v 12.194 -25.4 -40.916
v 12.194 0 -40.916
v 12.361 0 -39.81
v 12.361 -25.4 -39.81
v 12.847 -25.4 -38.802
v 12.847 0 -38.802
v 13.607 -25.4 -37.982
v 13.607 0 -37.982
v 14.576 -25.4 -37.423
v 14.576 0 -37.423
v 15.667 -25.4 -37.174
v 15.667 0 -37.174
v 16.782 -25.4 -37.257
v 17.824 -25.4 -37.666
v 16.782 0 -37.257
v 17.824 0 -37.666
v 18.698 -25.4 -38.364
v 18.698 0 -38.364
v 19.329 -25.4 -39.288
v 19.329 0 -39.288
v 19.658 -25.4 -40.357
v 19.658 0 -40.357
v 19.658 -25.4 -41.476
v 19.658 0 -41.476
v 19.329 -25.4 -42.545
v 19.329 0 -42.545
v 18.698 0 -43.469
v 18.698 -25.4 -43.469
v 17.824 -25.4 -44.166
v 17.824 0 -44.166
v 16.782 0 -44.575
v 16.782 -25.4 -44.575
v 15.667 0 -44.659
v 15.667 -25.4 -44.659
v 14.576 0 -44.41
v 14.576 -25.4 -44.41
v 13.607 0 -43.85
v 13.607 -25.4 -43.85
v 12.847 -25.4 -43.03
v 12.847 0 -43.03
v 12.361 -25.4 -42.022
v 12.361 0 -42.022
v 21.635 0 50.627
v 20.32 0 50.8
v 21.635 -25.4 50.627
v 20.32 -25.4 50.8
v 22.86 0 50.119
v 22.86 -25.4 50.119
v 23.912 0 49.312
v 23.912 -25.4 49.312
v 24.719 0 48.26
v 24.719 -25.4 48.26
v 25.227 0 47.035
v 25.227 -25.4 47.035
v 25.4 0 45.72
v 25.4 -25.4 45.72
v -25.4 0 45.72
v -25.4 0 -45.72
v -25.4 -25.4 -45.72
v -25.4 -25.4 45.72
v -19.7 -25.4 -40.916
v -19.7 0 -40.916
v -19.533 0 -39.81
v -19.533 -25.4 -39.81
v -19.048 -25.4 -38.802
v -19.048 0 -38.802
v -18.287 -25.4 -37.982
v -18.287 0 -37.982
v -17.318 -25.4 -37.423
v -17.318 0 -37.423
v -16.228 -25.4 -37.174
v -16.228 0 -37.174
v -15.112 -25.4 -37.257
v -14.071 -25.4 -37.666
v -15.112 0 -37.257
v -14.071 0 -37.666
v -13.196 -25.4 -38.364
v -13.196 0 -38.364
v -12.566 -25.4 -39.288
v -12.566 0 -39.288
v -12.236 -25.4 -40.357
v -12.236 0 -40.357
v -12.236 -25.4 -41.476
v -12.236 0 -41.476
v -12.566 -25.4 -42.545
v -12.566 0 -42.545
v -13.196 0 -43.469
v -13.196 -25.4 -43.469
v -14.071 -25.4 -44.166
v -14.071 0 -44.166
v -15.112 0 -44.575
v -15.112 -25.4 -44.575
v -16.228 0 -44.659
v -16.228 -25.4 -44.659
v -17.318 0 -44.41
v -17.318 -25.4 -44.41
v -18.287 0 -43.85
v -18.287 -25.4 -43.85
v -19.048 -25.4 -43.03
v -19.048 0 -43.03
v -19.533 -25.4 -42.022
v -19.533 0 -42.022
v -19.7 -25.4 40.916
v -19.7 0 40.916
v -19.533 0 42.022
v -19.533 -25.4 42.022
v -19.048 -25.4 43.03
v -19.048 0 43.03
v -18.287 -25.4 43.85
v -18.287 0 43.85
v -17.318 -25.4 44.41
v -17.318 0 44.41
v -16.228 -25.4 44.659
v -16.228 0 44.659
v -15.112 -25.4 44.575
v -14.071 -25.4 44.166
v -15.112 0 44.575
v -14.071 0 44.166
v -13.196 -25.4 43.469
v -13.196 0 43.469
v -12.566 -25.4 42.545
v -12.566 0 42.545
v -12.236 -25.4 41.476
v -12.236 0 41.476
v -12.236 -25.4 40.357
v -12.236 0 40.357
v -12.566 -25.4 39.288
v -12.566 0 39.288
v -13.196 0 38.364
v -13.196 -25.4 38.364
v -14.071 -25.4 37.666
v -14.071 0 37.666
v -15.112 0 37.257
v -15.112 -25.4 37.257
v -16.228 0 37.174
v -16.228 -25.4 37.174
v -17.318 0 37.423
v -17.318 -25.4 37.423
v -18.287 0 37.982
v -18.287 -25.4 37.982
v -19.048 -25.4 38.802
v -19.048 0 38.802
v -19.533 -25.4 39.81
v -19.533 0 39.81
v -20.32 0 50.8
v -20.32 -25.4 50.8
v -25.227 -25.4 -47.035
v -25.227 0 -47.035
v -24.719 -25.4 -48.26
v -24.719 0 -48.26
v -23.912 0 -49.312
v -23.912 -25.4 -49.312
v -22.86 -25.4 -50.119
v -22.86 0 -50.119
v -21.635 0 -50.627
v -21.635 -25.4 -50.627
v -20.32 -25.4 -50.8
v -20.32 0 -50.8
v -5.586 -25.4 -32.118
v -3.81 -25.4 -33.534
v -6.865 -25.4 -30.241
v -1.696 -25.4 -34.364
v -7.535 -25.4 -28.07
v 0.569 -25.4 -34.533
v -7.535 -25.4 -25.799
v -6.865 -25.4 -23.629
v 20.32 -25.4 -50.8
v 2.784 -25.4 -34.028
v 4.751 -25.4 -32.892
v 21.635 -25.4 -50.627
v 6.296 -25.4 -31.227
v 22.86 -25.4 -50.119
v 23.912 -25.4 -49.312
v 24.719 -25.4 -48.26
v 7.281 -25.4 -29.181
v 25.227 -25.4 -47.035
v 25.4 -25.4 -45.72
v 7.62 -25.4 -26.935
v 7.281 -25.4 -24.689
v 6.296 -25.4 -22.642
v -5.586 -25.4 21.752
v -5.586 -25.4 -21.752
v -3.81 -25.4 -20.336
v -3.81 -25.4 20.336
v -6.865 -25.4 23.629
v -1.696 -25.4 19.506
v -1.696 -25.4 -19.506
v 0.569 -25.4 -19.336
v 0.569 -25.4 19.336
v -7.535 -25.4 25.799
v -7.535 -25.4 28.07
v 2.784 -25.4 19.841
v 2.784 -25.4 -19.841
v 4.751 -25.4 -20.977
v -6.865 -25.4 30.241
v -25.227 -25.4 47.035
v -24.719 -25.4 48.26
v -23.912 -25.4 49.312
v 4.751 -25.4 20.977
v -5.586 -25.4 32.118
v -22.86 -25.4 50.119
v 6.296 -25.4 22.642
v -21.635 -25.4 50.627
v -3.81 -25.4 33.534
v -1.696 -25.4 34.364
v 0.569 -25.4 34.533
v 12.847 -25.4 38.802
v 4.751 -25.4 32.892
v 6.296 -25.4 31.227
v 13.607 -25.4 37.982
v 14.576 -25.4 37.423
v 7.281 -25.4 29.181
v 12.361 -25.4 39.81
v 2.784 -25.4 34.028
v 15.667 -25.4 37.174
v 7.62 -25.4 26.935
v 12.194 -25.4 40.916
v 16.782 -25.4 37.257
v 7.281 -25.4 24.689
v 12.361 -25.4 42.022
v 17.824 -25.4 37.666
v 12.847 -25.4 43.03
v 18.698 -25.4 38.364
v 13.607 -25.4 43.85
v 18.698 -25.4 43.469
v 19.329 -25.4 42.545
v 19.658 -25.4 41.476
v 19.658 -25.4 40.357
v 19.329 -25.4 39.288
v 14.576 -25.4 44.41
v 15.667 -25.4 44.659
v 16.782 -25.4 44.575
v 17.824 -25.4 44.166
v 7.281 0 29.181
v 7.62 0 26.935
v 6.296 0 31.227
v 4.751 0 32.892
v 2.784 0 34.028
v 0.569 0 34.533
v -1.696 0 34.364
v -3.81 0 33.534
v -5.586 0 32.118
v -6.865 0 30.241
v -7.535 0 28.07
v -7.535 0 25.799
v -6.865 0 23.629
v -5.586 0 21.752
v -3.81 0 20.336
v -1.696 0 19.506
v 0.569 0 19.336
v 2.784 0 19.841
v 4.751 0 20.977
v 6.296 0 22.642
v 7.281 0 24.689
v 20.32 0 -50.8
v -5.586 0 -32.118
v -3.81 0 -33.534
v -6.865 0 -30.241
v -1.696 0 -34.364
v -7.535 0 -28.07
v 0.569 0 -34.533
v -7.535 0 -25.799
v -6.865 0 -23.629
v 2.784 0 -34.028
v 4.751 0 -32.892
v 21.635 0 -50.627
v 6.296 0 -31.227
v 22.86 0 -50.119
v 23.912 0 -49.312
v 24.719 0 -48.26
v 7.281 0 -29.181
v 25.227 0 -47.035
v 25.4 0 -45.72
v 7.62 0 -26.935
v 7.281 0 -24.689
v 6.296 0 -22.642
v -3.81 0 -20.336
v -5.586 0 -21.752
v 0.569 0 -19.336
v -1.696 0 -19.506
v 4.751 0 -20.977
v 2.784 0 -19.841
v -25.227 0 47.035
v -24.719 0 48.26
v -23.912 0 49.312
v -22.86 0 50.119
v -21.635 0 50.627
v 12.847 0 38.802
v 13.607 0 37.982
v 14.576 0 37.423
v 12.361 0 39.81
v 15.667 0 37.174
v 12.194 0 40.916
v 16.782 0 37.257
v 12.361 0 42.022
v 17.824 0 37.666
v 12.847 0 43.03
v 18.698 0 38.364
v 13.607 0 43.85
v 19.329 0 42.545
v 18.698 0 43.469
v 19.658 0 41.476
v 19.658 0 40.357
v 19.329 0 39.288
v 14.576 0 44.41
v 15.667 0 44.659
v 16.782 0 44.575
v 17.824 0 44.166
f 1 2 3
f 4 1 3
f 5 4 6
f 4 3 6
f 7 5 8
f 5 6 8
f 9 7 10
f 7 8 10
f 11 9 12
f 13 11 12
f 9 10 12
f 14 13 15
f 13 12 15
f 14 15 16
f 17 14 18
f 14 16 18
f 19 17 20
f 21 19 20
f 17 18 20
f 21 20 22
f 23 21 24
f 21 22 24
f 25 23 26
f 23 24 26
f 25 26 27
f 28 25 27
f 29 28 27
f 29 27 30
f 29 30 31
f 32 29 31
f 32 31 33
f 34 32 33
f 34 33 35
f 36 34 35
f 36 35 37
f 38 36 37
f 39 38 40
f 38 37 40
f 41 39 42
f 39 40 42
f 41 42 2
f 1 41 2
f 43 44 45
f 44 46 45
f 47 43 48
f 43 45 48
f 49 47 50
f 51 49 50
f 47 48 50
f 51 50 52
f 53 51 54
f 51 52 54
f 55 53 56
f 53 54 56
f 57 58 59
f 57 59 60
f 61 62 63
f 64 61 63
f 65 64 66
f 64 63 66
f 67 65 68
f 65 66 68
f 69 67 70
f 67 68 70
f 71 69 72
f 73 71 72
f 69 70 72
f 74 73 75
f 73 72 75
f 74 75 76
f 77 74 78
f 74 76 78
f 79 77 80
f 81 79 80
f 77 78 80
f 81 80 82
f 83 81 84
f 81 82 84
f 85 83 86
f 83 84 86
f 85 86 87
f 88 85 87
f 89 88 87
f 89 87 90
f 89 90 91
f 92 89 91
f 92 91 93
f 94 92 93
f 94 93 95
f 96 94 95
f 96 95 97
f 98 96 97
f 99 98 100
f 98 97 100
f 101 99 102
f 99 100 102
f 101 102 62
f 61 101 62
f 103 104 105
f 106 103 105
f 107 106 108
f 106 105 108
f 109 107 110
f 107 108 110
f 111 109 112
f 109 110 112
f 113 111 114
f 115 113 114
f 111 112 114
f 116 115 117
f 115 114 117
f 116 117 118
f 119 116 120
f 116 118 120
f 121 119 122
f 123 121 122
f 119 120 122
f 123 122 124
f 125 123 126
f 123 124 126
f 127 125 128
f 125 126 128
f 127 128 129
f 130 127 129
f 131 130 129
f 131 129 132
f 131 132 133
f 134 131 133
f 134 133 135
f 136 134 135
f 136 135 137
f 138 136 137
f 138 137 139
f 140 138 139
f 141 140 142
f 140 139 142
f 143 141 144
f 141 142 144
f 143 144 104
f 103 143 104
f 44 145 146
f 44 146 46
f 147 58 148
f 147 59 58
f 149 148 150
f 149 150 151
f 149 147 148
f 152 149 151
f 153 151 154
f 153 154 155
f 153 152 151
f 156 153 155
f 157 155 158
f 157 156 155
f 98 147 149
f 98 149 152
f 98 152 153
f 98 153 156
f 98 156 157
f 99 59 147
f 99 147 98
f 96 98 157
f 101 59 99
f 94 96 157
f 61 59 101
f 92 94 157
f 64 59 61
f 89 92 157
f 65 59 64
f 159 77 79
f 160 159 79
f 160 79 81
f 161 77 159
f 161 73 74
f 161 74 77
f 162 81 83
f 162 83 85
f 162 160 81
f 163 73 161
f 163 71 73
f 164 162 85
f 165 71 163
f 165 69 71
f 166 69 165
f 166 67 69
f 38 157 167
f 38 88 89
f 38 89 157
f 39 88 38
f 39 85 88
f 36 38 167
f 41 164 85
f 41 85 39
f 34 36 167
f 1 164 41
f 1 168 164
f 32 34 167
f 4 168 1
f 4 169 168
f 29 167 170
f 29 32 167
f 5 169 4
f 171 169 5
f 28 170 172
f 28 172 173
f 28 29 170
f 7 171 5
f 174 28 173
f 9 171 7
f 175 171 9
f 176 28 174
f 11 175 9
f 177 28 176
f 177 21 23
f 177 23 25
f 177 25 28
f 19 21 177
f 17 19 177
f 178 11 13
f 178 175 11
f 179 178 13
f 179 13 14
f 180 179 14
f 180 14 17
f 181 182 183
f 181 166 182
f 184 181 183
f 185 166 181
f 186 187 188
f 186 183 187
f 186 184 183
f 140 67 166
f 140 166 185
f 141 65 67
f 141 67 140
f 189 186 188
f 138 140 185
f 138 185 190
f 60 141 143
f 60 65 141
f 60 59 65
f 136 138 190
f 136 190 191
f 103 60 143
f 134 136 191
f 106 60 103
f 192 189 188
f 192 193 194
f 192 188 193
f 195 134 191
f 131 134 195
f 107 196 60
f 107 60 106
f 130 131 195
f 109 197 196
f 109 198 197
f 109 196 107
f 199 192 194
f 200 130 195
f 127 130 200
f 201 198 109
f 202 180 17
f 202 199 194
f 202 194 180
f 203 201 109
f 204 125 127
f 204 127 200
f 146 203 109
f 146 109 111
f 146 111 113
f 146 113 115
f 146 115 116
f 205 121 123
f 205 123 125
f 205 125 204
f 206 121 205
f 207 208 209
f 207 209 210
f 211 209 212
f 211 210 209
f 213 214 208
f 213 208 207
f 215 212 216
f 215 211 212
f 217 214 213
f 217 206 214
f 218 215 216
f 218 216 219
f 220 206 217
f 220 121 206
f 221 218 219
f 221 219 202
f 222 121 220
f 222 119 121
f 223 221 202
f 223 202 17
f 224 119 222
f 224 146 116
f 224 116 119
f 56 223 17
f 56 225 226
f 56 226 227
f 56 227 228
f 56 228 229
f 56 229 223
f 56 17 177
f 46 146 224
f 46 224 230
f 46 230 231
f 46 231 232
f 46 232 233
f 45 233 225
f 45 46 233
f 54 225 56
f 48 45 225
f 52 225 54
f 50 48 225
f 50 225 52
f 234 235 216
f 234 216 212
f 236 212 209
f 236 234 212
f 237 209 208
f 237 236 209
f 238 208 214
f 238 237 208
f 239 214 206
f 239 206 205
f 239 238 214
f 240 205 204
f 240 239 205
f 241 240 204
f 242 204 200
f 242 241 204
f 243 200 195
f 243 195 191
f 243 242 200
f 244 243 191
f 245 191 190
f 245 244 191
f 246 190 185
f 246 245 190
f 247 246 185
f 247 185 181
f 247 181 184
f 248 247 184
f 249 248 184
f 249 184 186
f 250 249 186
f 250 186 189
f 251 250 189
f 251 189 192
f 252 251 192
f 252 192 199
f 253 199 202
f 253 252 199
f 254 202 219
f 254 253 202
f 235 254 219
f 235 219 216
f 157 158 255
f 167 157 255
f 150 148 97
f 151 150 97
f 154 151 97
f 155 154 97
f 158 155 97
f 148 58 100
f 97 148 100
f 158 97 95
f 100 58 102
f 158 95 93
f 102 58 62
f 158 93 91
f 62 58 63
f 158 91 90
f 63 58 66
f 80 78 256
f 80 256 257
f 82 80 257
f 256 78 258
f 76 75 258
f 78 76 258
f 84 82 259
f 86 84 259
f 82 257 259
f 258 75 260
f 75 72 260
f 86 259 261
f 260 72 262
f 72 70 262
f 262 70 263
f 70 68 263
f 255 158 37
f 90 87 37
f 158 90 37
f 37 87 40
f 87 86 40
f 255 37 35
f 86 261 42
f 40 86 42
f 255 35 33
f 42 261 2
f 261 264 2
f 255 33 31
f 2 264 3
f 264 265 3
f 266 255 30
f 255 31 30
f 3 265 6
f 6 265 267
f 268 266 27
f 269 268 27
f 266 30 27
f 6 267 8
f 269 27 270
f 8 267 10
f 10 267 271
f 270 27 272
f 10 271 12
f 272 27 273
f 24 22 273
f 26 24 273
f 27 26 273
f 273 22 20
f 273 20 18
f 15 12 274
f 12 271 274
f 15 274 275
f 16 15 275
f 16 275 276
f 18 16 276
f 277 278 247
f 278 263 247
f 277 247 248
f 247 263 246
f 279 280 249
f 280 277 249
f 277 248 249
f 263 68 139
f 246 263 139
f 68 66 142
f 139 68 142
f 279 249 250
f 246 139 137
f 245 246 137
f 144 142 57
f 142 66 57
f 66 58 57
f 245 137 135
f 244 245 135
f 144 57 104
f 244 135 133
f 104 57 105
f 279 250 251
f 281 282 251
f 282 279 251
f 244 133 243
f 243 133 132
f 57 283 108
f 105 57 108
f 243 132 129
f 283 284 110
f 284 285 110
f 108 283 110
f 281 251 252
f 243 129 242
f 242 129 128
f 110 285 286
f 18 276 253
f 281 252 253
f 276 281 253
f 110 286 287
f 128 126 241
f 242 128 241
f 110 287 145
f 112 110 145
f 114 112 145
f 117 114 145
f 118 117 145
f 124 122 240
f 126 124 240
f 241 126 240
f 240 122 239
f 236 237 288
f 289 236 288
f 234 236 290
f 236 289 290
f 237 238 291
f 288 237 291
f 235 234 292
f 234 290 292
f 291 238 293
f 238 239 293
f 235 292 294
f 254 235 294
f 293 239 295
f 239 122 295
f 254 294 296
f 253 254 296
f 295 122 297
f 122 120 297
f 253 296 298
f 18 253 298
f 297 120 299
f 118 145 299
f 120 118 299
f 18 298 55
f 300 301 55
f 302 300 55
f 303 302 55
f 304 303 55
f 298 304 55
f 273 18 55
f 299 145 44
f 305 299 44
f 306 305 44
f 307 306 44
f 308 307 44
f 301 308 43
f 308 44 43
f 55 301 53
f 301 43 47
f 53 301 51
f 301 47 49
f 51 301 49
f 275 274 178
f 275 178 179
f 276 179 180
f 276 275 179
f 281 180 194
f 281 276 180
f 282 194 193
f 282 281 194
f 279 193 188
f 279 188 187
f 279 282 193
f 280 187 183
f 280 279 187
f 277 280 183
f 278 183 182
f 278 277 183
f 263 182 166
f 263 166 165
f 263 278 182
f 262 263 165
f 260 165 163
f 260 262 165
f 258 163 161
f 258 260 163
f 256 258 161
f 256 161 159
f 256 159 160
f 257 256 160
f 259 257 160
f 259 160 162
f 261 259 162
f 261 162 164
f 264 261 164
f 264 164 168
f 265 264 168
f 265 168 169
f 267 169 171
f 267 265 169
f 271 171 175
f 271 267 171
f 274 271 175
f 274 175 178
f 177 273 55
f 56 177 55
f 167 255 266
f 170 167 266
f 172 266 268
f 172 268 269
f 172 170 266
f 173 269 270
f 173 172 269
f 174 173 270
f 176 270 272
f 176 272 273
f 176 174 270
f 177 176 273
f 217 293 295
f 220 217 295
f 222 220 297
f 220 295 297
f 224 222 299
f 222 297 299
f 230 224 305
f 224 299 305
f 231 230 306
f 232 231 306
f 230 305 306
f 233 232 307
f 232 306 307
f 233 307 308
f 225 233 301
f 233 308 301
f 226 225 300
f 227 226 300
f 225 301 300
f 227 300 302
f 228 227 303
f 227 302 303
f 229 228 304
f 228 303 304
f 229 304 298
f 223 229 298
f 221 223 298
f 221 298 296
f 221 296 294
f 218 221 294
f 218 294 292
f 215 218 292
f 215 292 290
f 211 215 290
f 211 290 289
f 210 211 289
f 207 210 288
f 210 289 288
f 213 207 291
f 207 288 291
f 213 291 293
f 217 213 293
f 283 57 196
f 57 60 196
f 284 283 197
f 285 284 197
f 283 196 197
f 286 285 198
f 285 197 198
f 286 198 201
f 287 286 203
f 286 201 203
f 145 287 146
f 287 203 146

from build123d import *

# Parameters (mm, degrees)
F0_W     = 50.8
F0_H     = 101.6
F0_R     = 7.62
F1_DEPTH = 25.4
F2_R     = 5.08
F3_R     = 3.752901
F4_DEPTH = 25.4


with BuildPart() as f1:
    # F0 (on Front) → F1 (new body)
    with BuildSketch(Plane.XZ):
        Rectangle(F0_W, F0_H)
        with Locations((0, -26.934734)):
            Circle(F0_R, mode=Mode.SUBTRACT)
        with Locations((0, 26.934734)):
            Circle(F0_R, mode=Mode.SUBTRACT)
    extrude(amount=F1_DEPTH)

    # F2
    f2_edges = [f1.edges().sort_by_distance(p)[0] for p in [
        (25.4, -12.7, -50.8),
        (25.4, -12.7, 50.8),
        (-25.4, -12.7, 50.8),
        (-25.4, -12.7, -50.8),
    ]]
    fillet(f2_edges, radius=F2_R)

    # F3 (on face) → F4 (cut)
    with BuildSketch(Plane(origin=(0, 0, 0), x_dir=(-1, 0, 0), z_dir=(0, 1, 0))):
        with Locations((-15.947323, 40.916275)):
            Circle(F3_R)
        with Locations((15.947323, 40.916275)):
            Circle(F3_R)
        with Locations((15.947323, -40.916275)):
            Circle(F3_R)
        with Locations((-15.947323, -40.916275)):
            Circle(F3_R)
    extrude(amount=-F4_DEPTH, mode=Mode.SUBTRACT)


solid = f1.part
